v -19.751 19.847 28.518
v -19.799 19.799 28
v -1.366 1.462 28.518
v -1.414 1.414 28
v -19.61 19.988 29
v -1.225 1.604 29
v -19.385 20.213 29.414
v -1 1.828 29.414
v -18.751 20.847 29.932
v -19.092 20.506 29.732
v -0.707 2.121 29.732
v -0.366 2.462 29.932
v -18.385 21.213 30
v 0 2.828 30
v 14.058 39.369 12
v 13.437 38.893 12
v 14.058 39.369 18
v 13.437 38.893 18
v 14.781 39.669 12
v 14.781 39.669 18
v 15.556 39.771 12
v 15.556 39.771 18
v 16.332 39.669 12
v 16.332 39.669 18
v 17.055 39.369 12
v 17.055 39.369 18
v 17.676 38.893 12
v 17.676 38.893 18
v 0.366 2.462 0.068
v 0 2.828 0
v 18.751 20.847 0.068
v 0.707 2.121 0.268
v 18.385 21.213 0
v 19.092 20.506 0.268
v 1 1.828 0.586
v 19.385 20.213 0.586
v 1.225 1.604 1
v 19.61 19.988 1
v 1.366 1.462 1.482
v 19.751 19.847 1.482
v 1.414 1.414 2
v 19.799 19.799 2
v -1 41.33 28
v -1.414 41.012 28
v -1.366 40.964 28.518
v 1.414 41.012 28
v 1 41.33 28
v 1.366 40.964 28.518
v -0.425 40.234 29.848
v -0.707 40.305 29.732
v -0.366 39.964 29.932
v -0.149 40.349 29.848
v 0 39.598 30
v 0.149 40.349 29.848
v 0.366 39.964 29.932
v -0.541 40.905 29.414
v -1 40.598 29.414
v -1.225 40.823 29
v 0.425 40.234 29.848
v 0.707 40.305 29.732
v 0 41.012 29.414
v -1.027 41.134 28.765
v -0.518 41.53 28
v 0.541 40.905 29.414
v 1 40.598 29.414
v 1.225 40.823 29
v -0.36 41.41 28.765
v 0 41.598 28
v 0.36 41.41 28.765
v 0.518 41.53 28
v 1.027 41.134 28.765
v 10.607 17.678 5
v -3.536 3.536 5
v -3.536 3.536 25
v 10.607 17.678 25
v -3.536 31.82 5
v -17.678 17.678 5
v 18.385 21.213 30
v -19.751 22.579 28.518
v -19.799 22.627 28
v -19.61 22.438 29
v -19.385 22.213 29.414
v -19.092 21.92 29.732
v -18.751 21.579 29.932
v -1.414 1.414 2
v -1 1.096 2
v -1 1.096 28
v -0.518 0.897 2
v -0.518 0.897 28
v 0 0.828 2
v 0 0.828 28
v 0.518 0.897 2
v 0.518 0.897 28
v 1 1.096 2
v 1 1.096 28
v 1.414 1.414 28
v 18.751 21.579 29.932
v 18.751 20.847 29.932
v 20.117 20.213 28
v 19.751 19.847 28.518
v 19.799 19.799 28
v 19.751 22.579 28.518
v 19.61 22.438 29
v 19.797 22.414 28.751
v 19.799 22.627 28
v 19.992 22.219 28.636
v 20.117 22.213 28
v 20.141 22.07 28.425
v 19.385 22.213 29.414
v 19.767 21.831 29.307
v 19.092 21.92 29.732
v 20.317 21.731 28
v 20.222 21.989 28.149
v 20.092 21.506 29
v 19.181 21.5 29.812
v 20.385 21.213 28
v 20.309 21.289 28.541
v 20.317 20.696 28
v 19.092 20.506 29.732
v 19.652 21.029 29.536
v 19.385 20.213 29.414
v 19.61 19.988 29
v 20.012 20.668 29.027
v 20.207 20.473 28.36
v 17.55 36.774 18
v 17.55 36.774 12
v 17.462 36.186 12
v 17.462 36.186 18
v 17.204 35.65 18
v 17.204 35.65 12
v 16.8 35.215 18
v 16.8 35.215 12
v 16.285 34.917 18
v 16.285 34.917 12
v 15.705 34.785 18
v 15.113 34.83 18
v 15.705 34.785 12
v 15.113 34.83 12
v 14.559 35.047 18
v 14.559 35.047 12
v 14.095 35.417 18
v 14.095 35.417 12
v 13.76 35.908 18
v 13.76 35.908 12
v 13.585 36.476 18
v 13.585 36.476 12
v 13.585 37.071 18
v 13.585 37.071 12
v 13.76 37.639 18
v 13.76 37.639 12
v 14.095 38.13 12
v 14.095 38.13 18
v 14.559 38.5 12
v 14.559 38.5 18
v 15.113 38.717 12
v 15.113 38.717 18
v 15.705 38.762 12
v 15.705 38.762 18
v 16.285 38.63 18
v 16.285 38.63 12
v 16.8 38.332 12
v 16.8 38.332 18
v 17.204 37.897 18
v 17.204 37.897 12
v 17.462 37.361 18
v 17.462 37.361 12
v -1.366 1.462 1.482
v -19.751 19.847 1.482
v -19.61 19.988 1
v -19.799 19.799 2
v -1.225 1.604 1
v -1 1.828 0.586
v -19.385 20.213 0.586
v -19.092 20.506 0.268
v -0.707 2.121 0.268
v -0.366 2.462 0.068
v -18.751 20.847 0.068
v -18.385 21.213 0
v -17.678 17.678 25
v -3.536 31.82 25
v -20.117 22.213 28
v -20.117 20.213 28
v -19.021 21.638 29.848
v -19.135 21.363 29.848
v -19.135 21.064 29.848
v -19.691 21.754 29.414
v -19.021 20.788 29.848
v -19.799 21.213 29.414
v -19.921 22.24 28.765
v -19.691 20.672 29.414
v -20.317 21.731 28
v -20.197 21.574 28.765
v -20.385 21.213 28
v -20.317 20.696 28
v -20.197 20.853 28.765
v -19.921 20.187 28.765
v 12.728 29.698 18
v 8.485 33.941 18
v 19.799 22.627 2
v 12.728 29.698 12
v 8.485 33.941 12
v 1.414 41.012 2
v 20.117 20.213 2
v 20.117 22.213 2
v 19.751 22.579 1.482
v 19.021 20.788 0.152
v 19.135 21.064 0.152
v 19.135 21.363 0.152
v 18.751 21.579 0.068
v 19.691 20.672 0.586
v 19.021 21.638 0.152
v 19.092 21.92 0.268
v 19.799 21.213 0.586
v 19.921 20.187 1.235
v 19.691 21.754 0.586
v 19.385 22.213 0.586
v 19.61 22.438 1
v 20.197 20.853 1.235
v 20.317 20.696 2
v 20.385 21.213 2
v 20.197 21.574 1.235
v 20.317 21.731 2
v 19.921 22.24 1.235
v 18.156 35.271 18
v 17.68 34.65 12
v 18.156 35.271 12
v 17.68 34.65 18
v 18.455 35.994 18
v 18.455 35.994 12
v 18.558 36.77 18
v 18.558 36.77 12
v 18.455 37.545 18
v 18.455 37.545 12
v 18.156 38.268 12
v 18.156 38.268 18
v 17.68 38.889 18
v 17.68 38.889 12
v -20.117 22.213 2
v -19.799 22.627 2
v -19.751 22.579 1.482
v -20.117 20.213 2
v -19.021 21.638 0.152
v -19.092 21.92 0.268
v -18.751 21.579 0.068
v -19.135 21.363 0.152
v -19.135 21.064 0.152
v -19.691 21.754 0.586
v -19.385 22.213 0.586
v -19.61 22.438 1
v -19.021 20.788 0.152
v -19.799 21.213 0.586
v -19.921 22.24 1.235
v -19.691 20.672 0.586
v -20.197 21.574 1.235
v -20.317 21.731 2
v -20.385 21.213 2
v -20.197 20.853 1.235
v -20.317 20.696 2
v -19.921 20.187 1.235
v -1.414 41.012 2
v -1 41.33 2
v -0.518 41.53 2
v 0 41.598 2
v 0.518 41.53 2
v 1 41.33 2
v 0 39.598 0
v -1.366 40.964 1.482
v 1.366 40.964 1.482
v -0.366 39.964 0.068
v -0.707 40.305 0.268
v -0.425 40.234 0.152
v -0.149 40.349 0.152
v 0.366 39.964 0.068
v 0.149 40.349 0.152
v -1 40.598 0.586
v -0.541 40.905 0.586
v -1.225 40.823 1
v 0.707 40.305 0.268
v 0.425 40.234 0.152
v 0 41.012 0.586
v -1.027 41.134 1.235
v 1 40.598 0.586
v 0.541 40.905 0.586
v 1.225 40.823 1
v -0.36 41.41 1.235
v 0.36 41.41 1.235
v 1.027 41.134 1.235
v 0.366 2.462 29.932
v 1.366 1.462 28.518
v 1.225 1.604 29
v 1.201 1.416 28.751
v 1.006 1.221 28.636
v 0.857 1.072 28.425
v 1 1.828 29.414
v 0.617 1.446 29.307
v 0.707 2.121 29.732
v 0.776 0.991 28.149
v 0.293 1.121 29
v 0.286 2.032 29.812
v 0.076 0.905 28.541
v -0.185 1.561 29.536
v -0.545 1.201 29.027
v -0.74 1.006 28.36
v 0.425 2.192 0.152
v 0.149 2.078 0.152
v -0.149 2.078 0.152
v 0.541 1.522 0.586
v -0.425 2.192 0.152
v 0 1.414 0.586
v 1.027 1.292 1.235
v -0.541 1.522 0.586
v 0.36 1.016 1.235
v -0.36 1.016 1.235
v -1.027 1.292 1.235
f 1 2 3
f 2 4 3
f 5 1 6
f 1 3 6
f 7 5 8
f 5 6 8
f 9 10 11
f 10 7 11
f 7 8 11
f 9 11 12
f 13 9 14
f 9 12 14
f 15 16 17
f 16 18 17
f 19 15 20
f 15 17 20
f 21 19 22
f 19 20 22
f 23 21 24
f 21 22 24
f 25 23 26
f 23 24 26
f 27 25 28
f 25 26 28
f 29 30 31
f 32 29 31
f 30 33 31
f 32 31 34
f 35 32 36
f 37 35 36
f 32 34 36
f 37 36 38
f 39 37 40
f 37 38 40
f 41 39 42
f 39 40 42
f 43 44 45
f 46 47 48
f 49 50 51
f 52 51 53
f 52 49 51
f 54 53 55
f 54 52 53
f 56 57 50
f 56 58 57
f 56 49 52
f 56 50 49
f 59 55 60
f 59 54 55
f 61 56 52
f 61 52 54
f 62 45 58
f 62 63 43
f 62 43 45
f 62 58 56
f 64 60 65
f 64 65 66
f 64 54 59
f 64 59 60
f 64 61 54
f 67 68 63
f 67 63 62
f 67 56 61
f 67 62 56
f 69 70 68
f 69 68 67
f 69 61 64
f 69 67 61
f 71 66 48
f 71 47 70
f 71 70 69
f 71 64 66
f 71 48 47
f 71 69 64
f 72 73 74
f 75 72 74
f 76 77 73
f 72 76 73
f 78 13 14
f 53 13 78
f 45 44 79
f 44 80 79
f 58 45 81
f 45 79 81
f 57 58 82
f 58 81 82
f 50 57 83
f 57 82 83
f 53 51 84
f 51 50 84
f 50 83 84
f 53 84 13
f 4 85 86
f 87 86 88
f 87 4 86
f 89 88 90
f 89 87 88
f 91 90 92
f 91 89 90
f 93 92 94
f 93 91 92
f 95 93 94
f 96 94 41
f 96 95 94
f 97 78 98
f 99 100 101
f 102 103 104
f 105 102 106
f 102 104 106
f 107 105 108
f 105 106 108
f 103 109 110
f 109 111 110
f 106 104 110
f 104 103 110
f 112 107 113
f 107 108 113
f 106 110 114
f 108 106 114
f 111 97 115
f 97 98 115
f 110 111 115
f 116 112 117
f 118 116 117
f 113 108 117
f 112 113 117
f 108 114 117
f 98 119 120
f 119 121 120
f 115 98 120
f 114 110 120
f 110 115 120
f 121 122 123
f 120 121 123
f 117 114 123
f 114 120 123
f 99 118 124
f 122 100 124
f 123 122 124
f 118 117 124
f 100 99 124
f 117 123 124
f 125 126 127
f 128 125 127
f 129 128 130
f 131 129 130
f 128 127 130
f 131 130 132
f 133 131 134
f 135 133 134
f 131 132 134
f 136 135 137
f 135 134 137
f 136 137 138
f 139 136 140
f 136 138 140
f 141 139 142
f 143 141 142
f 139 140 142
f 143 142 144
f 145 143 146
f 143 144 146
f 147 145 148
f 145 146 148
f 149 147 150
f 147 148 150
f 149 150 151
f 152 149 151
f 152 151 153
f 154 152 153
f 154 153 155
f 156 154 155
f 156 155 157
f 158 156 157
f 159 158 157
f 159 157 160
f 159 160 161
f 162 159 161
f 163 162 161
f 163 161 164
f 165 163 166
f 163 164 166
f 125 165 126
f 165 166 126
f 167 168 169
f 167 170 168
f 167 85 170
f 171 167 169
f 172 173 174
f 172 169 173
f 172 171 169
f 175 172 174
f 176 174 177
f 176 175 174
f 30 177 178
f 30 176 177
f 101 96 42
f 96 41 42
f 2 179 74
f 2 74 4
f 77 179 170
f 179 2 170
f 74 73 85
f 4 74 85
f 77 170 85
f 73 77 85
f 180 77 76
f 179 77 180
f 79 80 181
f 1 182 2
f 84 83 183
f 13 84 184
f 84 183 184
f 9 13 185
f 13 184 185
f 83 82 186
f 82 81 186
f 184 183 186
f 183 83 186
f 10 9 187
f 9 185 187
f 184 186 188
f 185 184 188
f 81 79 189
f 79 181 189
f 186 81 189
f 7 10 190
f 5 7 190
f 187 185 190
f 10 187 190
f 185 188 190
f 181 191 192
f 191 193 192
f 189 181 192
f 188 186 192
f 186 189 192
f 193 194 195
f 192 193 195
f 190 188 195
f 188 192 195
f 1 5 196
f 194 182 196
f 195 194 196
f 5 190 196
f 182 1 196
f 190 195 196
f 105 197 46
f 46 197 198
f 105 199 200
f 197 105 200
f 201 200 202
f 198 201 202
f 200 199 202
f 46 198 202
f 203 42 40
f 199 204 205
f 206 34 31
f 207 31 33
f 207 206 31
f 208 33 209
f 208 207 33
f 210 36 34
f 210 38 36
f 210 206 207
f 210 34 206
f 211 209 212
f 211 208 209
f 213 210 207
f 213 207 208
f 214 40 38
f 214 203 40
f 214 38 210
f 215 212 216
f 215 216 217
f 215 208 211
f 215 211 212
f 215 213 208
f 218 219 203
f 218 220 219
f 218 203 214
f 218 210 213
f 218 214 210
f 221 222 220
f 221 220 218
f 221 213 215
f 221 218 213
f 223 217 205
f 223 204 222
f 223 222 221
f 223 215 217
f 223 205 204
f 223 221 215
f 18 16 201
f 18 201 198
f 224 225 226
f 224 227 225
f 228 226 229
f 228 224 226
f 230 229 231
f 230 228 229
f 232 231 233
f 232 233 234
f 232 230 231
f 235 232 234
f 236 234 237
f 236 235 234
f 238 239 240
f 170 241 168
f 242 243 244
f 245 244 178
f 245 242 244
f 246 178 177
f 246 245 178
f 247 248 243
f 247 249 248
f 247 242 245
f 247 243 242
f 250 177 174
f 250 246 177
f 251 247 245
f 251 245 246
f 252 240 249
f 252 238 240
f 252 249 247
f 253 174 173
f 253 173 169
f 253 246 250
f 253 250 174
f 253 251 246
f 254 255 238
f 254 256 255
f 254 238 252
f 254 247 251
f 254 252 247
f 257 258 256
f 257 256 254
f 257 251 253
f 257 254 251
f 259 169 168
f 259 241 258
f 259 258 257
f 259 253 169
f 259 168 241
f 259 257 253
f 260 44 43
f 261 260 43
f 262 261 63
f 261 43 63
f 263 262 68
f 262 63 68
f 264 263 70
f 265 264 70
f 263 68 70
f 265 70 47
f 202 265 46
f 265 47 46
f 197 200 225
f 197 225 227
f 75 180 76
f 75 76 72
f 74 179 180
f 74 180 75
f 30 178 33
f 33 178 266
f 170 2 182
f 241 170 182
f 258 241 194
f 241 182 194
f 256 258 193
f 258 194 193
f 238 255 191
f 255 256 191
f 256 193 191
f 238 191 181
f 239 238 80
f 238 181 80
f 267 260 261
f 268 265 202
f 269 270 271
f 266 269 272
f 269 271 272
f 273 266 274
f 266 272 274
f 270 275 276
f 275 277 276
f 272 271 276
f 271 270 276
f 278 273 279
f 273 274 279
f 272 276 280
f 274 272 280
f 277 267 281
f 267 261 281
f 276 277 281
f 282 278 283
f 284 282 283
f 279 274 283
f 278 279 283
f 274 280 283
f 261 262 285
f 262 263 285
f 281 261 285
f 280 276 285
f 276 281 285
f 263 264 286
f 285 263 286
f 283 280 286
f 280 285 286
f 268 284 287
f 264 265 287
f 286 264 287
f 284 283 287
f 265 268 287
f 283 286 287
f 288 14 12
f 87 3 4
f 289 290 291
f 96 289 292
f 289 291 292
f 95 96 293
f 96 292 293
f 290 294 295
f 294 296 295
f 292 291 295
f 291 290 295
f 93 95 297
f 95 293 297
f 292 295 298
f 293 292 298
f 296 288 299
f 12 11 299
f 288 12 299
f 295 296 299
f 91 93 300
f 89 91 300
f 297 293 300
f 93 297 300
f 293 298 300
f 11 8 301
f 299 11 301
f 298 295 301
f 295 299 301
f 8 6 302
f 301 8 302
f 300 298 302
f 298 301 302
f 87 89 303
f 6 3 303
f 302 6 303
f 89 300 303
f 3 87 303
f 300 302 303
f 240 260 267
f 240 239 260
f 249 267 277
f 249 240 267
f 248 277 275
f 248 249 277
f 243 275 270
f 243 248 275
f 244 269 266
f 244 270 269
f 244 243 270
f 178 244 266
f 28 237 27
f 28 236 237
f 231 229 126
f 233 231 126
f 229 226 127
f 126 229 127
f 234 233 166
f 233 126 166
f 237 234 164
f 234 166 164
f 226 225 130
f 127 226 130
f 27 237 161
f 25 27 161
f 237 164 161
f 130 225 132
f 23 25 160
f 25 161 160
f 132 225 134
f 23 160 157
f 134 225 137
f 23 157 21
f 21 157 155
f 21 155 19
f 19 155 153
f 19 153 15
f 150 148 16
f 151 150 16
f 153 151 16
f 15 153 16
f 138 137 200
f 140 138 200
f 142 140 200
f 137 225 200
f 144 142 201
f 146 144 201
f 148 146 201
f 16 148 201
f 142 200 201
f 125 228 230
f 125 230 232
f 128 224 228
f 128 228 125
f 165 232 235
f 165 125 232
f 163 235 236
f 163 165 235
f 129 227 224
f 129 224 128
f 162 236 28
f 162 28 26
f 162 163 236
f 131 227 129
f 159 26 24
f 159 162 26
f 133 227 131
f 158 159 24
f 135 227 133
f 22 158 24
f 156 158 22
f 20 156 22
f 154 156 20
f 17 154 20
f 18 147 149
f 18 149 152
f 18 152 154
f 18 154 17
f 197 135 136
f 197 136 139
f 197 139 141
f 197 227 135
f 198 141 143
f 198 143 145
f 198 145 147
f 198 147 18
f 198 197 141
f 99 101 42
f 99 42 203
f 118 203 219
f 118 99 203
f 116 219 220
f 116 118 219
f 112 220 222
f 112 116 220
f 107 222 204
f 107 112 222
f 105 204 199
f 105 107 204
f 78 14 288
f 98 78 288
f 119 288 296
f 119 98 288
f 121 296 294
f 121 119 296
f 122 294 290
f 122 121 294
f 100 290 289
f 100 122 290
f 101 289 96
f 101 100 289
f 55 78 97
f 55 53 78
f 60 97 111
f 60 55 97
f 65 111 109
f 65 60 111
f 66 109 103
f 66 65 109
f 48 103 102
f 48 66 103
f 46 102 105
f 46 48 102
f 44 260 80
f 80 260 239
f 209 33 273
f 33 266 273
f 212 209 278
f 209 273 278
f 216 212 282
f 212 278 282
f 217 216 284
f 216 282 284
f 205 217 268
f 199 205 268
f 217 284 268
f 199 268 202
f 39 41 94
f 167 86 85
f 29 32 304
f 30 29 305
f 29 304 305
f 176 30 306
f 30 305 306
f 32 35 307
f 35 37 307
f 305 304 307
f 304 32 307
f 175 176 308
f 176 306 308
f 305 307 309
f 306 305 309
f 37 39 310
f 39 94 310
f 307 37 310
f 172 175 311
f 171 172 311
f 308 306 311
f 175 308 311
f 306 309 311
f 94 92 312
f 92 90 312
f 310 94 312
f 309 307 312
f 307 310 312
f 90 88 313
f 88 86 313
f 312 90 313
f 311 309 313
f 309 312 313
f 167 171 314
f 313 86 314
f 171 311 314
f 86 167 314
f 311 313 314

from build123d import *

# Parameters (mm, degrees)
F1_DEPTH = 30
F2_W     = 20
F2_H     = 20
F3_DEPTH = 20
F4_R     = 2
F5_W     = 6
F5_H     = 6
F6_DEPTH = 10
F7_R     = 2.9972
F8_R     = 1.9939
F9_DEPTH = 6


with BuildPart() as f1:
    # F0 (on Top) → F1 (new body)
    with BuildSketch(Plane.XY):
        Polygon((-21.213203, 21.213203), (0, 0), (21.213203, 21.213203), (0, 42.426407), align=None)
    extrude(amount=F1_DEPTH)

    # F2 (on face) → F3 (cut)
    with BuildSketch(Plane(origin=(0, 0, 0), x_dir=(0.707107, -0.707107, 0), z_dir=(-0.707107, -0.707107, 0))):
        with Locations((-15, 15)):
            Rectangle(F2_W, F2_H)
    extrude(amount=-F3_DEPTH, mode=Mode.SUBTRACT)

    # F4
    f4_edges = [f1.edges().sort_by_distance(p)[0] for p in [
        (0, 42.426407, 15),
        (-21.213203, 21.213203, 15),
        (-10.606602, 31.819805, 0),
        (-10.606602, 31.819805, 30),
        (-10.606602, 10.606602, 30),
        (10.606602, 10.606602, 30),
        (10.606602, 31.819805, 30),
        (0, 0, 15),
        (21.213203, 21.213203, 15),
        (10.606602, 10.606602, 0),
        (10.606602, 31.819805, 0),
        (-10.606602, 10.606602, 0),
    ]]
    fillet(f4_edges, radius=F4_R)

    # F5 (on face) → F6 (join)
    with BuildSketch(Plane(origin=(21.213203, 21.213203, 0), x_dir=(-0.707107, 0.707107, 0), z_dir=(0.707107, 0.707107, 0))):
        with Locations((15, 15)):
            Rectangle(F5_W, F5_H)
    extrude(amount=F6_DEPTH)

    # F7
    f7_edges = [f1.edges().sort_by_distance(p)[0] for p in [
        (19.79899, 36.769553, 15),
        (15.556349, 41.012193, 15),
    ]]
    fillet(f7_edges, radius=F7_R)

    # F8 (on face) → F9 (cut)
    with BuildSketch(Plane(origin=(0, 0, 12), x_dir=(1, 0, 0), z_dir=(0, 0, -1))):
        with Locations((15.556349, -36.773512)):
            Circle(F8_R)
    extrude(amount=-F9_DEPTH, mode=Mode.SUBTRACT)


solid = f1.part
